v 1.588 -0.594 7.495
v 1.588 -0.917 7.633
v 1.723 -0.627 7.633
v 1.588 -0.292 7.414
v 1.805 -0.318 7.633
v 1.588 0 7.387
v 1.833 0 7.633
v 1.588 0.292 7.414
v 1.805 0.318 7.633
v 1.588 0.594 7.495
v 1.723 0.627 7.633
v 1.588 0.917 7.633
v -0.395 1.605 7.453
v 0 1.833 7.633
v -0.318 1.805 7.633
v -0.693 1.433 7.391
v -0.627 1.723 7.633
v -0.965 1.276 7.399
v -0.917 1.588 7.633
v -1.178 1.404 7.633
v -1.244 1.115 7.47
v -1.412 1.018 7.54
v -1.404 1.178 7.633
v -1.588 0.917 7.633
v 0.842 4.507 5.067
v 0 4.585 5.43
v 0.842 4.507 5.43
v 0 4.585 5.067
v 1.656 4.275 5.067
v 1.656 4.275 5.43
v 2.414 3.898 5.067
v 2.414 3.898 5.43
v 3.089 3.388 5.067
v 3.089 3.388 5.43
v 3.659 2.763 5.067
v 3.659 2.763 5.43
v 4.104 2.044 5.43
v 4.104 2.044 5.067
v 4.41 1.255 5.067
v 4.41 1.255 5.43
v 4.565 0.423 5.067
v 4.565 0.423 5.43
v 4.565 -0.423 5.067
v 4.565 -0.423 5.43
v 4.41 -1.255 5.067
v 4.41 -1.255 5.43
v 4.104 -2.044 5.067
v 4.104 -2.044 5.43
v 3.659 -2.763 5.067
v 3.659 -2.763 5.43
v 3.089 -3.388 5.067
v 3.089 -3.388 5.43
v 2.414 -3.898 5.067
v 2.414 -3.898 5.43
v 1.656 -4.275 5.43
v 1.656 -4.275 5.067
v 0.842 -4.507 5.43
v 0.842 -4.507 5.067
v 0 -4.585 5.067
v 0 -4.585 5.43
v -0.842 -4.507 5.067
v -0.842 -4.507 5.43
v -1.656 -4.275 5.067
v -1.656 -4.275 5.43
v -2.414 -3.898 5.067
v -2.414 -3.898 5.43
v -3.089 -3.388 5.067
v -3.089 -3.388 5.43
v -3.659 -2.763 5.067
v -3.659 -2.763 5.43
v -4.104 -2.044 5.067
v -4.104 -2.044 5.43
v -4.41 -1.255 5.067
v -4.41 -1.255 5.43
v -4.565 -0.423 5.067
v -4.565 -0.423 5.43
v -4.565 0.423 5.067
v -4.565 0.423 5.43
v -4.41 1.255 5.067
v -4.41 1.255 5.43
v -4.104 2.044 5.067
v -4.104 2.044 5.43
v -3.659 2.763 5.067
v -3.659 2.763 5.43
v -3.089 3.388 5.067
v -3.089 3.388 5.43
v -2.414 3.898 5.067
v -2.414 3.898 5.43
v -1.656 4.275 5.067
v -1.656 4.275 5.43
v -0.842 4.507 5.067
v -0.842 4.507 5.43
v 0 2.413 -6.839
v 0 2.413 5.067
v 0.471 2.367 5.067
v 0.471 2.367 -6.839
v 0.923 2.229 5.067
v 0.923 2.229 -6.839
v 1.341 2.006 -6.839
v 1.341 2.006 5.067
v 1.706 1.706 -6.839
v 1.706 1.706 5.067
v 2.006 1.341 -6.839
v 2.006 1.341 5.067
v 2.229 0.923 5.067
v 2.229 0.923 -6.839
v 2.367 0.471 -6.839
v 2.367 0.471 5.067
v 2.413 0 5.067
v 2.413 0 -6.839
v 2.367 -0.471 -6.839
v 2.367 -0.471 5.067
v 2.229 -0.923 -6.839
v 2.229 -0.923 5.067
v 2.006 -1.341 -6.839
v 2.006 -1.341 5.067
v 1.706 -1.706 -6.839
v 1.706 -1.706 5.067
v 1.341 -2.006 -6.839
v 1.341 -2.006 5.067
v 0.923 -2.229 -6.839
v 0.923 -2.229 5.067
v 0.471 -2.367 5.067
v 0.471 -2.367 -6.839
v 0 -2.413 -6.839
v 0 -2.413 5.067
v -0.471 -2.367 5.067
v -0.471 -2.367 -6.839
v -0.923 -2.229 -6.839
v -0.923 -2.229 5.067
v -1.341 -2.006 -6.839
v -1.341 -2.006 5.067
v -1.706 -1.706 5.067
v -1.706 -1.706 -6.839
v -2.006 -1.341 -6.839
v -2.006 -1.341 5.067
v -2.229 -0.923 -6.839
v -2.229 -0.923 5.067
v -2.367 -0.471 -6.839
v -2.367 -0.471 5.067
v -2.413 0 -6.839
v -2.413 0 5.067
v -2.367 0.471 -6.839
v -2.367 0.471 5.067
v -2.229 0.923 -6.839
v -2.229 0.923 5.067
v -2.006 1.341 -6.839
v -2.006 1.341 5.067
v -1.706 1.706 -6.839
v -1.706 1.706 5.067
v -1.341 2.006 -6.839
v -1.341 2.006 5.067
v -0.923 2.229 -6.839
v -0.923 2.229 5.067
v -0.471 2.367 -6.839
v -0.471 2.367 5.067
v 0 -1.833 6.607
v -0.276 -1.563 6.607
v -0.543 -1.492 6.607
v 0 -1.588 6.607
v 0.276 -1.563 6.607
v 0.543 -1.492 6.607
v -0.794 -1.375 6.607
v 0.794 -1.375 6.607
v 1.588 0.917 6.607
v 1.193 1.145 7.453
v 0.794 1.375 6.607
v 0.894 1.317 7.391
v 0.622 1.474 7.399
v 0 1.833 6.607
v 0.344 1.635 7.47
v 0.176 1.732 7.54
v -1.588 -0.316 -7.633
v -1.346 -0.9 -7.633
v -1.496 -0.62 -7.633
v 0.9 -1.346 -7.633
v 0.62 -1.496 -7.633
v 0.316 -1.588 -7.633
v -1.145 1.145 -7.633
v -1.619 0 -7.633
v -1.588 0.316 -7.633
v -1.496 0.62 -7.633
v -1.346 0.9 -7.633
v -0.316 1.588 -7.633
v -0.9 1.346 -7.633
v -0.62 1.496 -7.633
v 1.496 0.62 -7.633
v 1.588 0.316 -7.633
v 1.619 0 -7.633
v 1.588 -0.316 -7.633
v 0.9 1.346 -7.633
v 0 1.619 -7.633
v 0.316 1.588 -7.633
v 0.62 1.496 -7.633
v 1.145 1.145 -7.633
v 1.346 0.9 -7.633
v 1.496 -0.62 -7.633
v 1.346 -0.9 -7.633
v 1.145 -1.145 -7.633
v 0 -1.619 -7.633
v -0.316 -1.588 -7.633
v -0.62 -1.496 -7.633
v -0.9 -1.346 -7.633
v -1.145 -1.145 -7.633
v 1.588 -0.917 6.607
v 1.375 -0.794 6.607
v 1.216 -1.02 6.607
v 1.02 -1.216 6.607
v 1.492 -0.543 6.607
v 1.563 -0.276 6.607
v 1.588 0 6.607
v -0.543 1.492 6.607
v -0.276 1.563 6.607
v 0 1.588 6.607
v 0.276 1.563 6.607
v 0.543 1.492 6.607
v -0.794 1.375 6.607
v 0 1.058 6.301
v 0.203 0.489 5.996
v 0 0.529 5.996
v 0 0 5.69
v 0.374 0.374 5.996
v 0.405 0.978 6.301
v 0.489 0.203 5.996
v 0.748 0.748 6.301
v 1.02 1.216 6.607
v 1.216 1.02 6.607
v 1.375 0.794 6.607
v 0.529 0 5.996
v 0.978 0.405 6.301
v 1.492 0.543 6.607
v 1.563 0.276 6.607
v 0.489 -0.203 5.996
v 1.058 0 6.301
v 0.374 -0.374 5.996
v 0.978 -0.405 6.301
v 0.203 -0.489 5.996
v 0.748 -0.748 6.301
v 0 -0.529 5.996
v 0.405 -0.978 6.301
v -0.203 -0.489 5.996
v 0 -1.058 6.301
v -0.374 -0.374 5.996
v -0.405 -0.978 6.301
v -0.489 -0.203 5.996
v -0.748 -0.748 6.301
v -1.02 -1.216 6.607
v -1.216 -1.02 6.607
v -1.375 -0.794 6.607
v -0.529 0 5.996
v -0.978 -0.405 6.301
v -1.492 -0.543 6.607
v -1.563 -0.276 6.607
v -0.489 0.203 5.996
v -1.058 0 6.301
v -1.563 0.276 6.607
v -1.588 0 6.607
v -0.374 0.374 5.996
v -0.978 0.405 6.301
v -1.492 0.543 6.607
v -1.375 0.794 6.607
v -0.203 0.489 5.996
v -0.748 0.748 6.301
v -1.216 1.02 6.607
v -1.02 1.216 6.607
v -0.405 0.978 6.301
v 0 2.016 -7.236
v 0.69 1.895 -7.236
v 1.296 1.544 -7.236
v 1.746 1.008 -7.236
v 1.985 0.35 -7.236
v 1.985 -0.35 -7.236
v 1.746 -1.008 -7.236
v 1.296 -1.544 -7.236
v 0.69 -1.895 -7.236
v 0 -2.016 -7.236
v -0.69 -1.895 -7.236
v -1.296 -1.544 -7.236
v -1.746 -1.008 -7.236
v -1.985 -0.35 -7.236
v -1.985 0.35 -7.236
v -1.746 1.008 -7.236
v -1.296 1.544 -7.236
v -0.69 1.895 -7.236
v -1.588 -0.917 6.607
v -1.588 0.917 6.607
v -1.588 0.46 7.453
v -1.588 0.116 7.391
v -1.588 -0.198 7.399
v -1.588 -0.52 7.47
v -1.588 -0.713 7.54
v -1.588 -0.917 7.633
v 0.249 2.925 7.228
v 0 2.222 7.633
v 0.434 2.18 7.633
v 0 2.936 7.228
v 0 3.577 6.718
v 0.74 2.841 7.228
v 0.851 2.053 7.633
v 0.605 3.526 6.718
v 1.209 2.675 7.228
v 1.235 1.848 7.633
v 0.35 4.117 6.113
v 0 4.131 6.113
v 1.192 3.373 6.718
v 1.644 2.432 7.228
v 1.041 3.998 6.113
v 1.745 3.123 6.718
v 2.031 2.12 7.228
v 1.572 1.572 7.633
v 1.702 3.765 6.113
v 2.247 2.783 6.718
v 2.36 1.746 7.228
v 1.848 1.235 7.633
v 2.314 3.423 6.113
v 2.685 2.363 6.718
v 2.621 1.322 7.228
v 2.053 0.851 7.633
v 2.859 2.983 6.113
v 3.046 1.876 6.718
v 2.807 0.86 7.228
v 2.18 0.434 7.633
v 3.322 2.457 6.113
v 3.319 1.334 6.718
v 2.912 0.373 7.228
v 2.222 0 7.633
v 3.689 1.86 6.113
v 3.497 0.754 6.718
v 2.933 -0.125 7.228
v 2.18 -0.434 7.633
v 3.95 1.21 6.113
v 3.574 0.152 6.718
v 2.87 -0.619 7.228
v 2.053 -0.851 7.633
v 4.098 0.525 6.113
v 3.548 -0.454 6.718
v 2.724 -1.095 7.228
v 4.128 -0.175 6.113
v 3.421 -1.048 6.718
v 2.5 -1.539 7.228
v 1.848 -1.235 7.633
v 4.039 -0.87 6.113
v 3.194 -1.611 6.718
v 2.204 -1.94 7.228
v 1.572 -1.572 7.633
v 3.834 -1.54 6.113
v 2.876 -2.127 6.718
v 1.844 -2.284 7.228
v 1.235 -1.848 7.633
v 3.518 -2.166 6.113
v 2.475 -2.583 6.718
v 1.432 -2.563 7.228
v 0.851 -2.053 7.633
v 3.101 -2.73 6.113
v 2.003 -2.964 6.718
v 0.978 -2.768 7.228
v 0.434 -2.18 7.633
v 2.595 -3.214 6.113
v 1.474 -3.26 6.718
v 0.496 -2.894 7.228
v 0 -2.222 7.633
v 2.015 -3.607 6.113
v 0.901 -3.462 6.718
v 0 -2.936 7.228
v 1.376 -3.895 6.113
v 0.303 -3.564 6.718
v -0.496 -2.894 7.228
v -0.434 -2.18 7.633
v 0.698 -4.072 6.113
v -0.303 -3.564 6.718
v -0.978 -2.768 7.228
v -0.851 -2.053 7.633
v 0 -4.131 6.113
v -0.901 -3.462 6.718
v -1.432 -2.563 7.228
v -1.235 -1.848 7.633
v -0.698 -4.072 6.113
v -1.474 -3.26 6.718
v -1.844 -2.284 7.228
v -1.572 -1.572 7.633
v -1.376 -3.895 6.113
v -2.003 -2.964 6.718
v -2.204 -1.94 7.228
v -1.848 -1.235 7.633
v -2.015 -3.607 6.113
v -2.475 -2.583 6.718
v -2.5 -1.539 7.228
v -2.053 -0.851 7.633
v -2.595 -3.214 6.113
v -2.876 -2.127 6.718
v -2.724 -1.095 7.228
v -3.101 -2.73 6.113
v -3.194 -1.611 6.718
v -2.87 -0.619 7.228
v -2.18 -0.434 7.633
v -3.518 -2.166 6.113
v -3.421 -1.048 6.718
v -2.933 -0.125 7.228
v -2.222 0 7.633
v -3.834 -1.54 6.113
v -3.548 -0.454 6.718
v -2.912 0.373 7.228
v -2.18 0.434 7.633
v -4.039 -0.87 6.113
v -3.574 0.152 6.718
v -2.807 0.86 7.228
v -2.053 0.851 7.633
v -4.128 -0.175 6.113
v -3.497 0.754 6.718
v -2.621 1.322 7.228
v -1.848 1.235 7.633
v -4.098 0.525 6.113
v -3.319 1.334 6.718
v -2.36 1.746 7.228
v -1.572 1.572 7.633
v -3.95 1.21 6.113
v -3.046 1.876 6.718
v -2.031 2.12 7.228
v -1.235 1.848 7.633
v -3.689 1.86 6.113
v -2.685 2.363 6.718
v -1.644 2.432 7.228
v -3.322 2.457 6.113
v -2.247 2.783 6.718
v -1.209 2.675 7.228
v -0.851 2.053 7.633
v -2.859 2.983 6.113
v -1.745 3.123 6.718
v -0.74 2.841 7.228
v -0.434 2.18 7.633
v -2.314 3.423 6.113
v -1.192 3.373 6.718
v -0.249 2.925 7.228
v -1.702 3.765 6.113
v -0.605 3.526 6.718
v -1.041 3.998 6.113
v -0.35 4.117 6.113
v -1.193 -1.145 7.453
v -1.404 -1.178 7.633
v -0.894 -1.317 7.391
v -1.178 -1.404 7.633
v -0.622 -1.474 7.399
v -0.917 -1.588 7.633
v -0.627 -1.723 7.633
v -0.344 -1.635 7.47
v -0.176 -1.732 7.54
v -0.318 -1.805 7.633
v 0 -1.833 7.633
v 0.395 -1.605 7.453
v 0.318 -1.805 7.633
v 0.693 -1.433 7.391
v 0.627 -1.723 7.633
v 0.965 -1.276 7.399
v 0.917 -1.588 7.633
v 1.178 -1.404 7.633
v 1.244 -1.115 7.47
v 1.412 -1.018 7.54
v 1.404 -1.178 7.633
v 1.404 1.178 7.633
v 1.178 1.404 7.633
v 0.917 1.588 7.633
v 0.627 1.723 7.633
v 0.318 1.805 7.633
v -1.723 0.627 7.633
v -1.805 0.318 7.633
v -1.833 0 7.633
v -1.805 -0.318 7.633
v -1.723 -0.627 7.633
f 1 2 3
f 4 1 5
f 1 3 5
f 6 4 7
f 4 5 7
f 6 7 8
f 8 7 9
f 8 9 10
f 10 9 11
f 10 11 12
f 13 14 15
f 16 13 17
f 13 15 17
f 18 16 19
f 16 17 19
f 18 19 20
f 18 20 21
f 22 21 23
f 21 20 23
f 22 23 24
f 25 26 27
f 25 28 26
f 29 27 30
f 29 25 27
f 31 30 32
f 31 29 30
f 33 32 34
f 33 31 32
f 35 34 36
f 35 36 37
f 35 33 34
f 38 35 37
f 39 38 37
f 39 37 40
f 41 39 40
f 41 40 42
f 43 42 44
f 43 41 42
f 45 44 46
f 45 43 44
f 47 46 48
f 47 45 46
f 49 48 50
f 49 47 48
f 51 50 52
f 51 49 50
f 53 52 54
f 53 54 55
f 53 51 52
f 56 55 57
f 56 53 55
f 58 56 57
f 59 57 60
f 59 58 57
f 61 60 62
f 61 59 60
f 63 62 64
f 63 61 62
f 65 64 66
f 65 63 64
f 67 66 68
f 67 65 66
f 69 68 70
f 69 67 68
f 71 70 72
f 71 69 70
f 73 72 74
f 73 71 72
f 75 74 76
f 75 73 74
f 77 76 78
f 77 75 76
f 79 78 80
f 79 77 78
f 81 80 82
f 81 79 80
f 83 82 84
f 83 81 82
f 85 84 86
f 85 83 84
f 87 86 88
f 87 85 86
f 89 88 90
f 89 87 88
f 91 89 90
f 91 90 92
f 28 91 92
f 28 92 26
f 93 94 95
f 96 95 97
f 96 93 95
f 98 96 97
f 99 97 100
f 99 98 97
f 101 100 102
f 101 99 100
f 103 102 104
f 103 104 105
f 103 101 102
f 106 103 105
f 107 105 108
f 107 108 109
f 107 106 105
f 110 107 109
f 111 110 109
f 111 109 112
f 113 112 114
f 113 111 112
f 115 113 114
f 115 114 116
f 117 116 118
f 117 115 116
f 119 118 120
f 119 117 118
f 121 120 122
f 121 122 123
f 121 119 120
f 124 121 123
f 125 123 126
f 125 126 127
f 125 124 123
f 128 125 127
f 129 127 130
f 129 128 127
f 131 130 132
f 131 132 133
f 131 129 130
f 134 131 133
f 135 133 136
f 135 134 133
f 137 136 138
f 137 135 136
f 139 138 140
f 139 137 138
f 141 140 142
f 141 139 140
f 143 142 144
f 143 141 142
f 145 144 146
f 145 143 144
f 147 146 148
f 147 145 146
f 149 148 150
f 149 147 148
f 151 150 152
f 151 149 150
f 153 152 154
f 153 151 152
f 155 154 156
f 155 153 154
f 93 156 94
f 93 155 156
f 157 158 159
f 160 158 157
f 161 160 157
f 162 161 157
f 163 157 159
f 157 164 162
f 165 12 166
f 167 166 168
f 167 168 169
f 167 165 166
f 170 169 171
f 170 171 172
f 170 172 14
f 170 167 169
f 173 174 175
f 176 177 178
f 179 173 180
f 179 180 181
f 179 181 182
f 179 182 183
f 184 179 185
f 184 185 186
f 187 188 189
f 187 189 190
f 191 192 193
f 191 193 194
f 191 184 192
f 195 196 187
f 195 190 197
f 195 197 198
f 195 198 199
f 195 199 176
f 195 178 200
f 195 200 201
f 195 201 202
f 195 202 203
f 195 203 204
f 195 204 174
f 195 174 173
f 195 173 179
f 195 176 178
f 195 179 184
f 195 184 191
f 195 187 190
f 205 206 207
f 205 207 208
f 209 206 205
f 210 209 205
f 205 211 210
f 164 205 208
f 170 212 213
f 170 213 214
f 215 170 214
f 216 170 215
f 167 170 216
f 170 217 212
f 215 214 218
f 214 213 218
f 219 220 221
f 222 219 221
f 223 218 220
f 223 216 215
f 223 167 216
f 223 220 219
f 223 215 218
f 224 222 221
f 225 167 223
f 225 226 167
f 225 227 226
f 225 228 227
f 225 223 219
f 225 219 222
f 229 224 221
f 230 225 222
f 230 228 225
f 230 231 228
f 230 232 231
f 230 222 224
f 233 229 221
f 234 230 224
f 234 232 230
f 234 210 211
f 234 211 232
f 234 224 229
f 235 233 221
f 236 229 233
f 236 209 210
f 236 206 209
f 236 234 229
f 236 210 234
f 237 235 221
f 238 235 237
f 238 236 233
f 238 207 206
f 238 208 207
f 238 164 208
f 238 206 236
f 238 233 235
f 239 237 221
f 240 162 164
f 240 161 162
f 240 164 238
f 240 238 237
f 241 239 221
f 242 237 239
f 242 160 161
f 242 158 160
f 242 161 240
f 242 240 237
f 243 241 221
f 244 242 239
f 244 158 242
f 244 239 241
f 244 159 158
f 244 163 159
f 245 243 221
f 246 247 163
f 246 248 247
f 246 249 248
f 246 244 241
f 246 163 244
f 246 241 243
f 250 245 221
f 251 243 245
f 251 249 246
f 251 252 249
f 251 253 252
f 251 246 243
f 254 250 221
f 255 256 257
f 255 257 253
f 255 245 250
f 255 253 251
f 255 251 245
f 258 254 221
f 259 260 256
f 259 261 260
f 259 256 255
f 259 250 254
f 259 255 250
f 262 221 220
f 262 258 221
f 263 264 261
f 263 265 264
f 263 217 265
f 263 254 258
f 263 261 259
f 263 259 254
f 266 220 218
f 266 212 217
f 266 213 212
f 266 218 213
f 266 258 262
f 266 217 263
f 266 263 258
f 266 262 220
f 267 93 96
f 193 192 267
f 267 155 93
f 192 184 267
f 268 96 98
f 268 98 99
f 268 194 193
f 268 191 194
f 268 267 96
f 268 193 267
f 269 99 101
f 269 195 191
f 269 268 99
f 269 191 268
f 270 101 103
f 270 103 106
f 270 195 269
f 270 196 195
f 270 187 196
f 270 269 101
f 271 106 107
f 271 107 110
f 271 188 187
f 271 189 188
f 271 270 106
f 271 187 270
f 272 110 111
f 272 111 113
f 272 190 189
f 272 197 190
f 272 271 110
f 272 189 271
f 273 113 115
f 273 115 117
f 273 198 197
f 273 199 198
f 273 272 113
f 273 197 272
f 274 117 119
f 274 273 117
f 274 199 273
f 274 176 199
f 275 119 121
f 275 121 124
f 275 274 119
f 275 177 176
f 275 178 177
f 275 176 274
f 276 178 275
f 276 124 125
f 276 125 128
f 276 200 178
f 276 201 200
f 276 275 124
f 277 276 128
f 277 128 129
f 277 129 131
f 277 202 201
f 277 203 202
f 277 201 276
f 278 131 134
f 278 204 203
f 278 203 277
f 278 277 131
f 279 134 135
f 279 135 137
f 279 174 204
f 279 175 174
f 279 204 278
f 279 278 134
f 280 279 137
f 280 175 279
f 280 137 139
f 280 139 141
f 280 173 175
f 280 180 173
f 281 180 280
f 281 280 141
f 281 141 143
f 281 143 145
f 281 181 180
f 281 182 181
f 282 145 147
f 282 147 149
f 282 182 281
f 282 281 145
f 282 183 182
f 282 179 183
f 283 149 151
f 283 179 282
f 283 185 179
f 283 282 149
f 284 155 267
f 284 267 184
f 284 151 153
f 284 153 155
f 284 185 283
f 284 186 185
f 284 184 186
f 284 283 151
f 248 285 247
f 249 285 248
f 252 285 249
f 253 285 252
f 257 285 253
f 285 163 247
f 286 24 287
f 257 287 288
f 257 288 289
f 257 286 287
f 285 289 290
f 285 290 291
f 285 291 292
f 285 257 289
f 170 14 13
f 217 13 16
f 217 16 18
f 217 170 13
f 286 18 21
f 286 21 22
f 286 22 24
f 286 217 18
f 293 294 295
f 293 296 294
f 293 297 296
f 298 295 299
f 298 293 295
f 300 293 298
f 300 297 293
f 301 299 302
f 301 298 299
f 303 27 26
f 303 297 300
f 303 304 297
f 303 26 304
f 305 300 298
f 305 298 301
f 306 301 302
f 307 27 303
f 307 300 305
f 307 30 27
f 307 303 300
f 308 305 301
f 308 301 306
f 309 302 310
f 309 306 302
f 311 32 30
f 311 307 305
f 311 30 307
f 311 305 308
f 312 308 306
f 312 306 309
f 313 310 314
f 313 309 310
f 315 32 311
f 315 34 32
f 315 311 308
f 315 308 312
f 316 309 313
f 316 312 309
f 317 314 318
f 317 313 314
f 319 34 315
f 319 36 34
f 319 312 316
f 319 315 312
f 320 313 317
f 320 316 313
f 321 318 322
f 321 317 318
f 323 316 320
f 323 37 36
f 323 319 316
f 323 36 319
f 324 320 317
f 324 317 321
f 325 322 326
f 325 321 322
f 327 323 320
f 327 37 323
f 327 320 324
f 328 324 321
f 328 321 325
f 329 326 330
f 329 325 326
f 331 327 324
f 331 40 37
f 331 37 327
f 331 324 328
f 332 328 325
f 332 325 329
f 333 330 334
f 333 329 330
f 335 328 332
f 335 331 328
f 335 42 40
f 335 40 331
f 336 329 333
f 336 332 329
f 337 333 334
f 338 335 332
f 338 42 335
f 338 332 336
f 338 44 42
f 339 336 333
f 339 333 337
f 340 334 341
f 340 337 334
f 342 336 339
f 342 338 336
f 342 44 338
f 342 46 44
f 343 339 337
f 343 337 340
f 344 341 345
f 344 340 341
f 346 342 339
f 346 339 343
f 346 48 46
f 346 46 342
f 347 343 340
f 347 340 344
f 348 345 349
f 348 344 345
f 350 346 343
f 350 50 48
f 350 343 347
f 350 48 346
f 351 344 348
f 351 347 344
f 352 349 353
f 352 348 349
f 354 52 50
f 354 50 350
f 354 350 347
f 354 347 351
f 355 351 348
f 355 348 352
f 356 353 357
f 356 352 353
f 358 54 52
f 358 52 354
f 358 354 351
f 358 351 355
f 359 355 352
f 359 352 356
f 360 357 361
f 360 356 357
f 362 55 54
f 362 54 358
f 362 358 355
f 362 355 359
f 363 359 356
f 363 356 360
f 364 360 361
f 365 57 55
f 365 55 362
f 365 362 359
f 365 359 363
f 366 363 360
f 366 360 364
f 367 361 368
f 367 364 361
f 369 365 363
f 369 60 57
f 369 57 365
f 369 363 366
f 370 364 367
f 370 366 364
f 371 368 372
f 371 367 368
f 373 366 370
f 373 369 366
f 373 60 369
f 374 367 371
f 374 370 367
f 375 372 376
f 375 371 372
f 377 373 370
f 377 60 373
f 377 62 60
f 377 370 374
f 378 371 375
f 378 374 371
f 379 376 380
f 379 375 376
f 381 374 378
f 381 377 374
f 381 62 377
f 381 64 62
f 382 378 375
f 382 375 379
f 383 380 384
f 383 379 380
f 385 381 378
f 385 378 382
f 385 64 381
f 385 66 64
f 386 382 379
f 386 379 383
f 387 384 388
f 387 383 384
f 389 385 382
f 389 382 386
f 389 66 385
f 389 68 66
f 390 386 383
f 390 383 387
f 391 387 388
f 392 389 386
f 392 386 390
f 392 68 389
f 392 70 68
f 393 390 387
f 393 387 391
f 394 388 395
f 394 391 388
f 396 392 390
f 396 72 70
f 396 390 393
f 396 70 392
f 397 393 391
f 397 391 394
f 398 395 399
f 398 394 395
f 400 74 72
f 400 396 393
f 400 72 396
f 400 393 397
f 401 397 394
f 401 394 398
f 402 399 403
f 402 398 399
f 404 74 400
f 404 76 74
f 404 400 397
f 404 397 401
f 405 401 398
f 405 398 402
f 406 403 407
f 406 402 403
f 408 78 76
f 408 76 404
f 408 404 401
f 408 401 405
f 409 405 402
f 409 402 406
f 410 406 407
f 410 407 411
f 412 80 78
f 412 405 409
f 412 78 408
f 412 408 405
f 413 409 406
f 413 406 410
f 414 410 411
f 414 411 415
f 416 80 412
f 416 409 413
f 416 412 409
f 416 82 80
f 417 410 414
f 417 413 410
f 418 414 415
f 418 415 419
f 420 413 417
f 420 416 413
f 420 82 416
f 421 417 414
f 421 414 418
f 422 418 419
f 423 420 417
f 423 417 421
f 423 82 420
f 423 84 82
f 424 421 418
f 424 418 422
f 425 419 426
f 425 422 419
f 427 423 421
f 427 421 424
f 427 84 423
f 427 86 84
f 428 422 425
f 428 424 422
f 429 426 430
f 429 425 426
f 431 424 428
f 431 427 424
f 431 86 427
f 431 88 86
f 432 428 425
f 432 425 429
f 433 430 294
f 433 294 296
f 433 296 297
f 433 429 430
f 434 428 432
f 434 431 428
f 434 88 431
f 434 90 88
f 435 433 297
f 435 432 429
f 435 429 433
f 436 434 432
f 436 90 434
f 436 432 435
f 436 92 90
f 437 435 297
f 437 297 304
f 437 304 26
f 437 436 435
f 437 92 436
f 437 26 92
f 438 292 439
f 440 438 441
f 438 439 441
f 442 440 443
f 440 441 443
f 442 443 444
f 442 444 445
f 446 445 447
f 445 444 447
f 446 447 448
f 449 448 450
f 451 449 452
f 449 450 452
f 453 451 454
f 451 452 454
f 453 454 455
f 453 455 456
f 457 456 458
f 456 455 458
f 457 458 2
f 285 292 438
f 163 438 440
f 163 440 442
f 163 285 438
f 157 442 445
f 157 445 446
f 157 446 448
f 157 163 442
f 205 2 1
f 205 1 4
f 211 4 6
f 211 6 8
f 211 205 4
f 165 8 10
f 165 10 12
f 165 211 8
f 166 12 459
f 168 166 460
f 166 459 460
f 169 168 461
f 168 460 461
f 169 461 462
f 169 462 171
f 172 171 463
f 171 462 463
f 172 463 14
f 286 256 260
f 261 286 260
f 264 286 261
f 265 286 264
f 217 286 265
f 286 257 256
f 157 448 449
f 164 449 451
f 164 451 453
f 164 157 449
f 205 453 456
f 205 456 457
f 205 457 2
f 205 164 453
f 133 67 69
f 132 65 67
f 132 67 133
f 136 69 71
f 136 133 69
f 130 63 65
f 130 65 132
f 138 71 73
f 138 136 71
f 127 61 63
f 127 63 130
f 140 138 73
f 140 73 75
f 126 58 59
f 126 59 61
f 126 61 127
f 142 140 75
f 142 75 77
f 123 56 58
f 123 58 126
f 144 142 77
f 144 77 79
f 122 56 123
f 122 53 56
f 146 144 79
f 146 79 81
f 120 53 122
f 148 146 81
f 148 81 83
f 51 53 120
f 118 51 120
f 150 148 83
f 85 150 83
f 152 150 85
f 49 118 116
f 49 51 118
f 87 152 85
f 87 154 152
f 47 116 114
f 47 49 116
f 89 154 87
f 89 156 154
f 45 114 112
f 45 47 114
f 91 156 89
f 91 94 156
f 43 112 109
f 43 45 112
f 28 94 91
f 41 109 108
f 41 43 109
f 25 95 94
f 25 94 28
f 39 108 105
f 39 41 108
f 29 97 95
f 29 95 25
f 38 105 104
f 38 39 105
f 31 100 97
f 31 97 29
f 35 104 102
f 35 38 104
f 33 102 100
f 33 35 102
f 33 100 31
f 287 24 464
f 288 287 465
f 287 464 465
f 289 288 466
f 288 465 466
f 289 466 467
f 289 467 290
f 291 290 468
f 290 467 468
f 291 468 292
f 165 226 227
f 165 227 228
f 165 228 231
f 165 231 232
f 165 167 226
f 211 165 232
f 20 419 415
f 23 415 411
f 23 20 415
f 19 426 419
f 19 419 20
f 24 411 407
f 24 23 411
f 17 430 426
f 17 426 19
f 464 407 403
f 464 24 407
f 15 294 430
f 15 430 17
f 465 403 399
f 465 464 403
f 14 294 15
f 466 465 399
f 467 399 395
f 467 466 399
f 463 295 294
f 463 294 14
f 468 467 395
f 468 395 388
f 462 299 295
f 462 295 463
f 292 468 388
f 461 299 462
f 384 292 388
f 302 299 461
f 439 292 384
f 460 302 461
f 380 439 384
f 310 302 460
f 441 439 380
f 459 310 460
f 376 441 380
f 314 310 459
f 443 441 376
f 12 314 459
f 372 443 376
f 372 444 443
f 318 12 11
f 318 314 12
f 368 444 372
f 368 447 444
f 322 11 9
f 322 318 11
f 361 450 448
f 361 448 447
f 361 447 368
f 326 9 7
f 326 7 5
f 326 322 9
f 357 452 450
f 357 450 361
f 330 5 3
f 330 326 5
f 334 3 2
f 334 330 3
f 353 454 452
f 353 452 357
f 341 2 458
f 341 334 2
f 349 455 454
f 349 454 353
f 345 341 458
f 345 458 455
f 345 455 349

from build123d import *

# Parameters (mm, degrees)
CUT_EXTRUDE1_START = 6.60654
CUT_EXTRUDE1_DEPTH = 2.02616
SKETCH4_R          = 1.833087105
CUT_EXTRUDE2_DEPTH = 1.02616
CUT_EXTRUDE2_DRAFT = -45


with BuildPart() as part:
    # Sketch2 → Revolve1 (revolve)
    with BuildSketch(Plane(origin=(0, 0, 0), x_dir=(0, 0, -1), z_dir=(1, 0, 0))):
        with BuildLine():
            Line((-7.6327, 1.5875), (-7.6327, 2.2225))
            ThreePointArc((-7.6327, 2.2225), (-6.717752118, 3.57733025), (-5.430157143, 4.5847))
            Line((-5.430157143, 4.5847), (-5.0673, 4.5847))
            Line((-5.0673, 4.5847), (-5.0673, 2.413))
            Line((-5.0673, 2.413), (6.83895, 2.413))
            Line((6.83895, 2.413), (7.6327, 1.61925))
            Line((7.6327, 1.61925), (7.6327, 0))
            Line((7.6327, 0), (-5.689996448, 0))
            Line((-5.689996448, 0), (-6.60654, 1.5875))
            Line((-6.60654, 1.5875), (-7.6327, 1.5875))
        make_face()
    revolve(axis=Axis((0, 0, 7.6327), (0, 0, -1)))

    # Sketch3 → Cut-Extrude1 (cut, through all)
    with BuildSketch(Plane.XY.offset(CUT_EXTRUDE1_START)):
        Polygon((0, 1.833087105), (-1.5875, 0.916543552), (-1.5875, -0.916543552), (0, -1.833087105), (1.5875, -0.916543552), (1.5875, 0.916543552), align=None)
    extrude(amount=CUT_EXTRUDE1_DEPTH, mode=Mode.SUBTRACT)


with BuildPart() as cut_extrude2_tool:
    # Sketch4 → Cut-Extrude2 (with draft: the straight prism first)
    with BuildSketch(Plane.XY.offset(7.6327)):
        Circle(SKETCH4_R)
    extrude(amount=-CUT_EXTRUDE2_DEPTH)
    # Cut-Extrude2: the draft: its side faces are tilted about the plane it starts from
    cut_extrude2_sides = [cut_extrude2_tool.faces().sort_by_distance(p)[0] for p in [
        (-1.833087105, 0, 7.11962),
    ]]
    draft(cut_extrude2_sides, Plane.XY.offset(7.6327), CUT_EXTRUDE2_DRAFT)


with BuildPart() as part_1:
    add(part.part)

    # Cut-Extrude2: cut by cut_extrude2_tool
    add(cut_extrude2_tool.part, mode=Mode.SUBTRACT)


solid = part_1.part
